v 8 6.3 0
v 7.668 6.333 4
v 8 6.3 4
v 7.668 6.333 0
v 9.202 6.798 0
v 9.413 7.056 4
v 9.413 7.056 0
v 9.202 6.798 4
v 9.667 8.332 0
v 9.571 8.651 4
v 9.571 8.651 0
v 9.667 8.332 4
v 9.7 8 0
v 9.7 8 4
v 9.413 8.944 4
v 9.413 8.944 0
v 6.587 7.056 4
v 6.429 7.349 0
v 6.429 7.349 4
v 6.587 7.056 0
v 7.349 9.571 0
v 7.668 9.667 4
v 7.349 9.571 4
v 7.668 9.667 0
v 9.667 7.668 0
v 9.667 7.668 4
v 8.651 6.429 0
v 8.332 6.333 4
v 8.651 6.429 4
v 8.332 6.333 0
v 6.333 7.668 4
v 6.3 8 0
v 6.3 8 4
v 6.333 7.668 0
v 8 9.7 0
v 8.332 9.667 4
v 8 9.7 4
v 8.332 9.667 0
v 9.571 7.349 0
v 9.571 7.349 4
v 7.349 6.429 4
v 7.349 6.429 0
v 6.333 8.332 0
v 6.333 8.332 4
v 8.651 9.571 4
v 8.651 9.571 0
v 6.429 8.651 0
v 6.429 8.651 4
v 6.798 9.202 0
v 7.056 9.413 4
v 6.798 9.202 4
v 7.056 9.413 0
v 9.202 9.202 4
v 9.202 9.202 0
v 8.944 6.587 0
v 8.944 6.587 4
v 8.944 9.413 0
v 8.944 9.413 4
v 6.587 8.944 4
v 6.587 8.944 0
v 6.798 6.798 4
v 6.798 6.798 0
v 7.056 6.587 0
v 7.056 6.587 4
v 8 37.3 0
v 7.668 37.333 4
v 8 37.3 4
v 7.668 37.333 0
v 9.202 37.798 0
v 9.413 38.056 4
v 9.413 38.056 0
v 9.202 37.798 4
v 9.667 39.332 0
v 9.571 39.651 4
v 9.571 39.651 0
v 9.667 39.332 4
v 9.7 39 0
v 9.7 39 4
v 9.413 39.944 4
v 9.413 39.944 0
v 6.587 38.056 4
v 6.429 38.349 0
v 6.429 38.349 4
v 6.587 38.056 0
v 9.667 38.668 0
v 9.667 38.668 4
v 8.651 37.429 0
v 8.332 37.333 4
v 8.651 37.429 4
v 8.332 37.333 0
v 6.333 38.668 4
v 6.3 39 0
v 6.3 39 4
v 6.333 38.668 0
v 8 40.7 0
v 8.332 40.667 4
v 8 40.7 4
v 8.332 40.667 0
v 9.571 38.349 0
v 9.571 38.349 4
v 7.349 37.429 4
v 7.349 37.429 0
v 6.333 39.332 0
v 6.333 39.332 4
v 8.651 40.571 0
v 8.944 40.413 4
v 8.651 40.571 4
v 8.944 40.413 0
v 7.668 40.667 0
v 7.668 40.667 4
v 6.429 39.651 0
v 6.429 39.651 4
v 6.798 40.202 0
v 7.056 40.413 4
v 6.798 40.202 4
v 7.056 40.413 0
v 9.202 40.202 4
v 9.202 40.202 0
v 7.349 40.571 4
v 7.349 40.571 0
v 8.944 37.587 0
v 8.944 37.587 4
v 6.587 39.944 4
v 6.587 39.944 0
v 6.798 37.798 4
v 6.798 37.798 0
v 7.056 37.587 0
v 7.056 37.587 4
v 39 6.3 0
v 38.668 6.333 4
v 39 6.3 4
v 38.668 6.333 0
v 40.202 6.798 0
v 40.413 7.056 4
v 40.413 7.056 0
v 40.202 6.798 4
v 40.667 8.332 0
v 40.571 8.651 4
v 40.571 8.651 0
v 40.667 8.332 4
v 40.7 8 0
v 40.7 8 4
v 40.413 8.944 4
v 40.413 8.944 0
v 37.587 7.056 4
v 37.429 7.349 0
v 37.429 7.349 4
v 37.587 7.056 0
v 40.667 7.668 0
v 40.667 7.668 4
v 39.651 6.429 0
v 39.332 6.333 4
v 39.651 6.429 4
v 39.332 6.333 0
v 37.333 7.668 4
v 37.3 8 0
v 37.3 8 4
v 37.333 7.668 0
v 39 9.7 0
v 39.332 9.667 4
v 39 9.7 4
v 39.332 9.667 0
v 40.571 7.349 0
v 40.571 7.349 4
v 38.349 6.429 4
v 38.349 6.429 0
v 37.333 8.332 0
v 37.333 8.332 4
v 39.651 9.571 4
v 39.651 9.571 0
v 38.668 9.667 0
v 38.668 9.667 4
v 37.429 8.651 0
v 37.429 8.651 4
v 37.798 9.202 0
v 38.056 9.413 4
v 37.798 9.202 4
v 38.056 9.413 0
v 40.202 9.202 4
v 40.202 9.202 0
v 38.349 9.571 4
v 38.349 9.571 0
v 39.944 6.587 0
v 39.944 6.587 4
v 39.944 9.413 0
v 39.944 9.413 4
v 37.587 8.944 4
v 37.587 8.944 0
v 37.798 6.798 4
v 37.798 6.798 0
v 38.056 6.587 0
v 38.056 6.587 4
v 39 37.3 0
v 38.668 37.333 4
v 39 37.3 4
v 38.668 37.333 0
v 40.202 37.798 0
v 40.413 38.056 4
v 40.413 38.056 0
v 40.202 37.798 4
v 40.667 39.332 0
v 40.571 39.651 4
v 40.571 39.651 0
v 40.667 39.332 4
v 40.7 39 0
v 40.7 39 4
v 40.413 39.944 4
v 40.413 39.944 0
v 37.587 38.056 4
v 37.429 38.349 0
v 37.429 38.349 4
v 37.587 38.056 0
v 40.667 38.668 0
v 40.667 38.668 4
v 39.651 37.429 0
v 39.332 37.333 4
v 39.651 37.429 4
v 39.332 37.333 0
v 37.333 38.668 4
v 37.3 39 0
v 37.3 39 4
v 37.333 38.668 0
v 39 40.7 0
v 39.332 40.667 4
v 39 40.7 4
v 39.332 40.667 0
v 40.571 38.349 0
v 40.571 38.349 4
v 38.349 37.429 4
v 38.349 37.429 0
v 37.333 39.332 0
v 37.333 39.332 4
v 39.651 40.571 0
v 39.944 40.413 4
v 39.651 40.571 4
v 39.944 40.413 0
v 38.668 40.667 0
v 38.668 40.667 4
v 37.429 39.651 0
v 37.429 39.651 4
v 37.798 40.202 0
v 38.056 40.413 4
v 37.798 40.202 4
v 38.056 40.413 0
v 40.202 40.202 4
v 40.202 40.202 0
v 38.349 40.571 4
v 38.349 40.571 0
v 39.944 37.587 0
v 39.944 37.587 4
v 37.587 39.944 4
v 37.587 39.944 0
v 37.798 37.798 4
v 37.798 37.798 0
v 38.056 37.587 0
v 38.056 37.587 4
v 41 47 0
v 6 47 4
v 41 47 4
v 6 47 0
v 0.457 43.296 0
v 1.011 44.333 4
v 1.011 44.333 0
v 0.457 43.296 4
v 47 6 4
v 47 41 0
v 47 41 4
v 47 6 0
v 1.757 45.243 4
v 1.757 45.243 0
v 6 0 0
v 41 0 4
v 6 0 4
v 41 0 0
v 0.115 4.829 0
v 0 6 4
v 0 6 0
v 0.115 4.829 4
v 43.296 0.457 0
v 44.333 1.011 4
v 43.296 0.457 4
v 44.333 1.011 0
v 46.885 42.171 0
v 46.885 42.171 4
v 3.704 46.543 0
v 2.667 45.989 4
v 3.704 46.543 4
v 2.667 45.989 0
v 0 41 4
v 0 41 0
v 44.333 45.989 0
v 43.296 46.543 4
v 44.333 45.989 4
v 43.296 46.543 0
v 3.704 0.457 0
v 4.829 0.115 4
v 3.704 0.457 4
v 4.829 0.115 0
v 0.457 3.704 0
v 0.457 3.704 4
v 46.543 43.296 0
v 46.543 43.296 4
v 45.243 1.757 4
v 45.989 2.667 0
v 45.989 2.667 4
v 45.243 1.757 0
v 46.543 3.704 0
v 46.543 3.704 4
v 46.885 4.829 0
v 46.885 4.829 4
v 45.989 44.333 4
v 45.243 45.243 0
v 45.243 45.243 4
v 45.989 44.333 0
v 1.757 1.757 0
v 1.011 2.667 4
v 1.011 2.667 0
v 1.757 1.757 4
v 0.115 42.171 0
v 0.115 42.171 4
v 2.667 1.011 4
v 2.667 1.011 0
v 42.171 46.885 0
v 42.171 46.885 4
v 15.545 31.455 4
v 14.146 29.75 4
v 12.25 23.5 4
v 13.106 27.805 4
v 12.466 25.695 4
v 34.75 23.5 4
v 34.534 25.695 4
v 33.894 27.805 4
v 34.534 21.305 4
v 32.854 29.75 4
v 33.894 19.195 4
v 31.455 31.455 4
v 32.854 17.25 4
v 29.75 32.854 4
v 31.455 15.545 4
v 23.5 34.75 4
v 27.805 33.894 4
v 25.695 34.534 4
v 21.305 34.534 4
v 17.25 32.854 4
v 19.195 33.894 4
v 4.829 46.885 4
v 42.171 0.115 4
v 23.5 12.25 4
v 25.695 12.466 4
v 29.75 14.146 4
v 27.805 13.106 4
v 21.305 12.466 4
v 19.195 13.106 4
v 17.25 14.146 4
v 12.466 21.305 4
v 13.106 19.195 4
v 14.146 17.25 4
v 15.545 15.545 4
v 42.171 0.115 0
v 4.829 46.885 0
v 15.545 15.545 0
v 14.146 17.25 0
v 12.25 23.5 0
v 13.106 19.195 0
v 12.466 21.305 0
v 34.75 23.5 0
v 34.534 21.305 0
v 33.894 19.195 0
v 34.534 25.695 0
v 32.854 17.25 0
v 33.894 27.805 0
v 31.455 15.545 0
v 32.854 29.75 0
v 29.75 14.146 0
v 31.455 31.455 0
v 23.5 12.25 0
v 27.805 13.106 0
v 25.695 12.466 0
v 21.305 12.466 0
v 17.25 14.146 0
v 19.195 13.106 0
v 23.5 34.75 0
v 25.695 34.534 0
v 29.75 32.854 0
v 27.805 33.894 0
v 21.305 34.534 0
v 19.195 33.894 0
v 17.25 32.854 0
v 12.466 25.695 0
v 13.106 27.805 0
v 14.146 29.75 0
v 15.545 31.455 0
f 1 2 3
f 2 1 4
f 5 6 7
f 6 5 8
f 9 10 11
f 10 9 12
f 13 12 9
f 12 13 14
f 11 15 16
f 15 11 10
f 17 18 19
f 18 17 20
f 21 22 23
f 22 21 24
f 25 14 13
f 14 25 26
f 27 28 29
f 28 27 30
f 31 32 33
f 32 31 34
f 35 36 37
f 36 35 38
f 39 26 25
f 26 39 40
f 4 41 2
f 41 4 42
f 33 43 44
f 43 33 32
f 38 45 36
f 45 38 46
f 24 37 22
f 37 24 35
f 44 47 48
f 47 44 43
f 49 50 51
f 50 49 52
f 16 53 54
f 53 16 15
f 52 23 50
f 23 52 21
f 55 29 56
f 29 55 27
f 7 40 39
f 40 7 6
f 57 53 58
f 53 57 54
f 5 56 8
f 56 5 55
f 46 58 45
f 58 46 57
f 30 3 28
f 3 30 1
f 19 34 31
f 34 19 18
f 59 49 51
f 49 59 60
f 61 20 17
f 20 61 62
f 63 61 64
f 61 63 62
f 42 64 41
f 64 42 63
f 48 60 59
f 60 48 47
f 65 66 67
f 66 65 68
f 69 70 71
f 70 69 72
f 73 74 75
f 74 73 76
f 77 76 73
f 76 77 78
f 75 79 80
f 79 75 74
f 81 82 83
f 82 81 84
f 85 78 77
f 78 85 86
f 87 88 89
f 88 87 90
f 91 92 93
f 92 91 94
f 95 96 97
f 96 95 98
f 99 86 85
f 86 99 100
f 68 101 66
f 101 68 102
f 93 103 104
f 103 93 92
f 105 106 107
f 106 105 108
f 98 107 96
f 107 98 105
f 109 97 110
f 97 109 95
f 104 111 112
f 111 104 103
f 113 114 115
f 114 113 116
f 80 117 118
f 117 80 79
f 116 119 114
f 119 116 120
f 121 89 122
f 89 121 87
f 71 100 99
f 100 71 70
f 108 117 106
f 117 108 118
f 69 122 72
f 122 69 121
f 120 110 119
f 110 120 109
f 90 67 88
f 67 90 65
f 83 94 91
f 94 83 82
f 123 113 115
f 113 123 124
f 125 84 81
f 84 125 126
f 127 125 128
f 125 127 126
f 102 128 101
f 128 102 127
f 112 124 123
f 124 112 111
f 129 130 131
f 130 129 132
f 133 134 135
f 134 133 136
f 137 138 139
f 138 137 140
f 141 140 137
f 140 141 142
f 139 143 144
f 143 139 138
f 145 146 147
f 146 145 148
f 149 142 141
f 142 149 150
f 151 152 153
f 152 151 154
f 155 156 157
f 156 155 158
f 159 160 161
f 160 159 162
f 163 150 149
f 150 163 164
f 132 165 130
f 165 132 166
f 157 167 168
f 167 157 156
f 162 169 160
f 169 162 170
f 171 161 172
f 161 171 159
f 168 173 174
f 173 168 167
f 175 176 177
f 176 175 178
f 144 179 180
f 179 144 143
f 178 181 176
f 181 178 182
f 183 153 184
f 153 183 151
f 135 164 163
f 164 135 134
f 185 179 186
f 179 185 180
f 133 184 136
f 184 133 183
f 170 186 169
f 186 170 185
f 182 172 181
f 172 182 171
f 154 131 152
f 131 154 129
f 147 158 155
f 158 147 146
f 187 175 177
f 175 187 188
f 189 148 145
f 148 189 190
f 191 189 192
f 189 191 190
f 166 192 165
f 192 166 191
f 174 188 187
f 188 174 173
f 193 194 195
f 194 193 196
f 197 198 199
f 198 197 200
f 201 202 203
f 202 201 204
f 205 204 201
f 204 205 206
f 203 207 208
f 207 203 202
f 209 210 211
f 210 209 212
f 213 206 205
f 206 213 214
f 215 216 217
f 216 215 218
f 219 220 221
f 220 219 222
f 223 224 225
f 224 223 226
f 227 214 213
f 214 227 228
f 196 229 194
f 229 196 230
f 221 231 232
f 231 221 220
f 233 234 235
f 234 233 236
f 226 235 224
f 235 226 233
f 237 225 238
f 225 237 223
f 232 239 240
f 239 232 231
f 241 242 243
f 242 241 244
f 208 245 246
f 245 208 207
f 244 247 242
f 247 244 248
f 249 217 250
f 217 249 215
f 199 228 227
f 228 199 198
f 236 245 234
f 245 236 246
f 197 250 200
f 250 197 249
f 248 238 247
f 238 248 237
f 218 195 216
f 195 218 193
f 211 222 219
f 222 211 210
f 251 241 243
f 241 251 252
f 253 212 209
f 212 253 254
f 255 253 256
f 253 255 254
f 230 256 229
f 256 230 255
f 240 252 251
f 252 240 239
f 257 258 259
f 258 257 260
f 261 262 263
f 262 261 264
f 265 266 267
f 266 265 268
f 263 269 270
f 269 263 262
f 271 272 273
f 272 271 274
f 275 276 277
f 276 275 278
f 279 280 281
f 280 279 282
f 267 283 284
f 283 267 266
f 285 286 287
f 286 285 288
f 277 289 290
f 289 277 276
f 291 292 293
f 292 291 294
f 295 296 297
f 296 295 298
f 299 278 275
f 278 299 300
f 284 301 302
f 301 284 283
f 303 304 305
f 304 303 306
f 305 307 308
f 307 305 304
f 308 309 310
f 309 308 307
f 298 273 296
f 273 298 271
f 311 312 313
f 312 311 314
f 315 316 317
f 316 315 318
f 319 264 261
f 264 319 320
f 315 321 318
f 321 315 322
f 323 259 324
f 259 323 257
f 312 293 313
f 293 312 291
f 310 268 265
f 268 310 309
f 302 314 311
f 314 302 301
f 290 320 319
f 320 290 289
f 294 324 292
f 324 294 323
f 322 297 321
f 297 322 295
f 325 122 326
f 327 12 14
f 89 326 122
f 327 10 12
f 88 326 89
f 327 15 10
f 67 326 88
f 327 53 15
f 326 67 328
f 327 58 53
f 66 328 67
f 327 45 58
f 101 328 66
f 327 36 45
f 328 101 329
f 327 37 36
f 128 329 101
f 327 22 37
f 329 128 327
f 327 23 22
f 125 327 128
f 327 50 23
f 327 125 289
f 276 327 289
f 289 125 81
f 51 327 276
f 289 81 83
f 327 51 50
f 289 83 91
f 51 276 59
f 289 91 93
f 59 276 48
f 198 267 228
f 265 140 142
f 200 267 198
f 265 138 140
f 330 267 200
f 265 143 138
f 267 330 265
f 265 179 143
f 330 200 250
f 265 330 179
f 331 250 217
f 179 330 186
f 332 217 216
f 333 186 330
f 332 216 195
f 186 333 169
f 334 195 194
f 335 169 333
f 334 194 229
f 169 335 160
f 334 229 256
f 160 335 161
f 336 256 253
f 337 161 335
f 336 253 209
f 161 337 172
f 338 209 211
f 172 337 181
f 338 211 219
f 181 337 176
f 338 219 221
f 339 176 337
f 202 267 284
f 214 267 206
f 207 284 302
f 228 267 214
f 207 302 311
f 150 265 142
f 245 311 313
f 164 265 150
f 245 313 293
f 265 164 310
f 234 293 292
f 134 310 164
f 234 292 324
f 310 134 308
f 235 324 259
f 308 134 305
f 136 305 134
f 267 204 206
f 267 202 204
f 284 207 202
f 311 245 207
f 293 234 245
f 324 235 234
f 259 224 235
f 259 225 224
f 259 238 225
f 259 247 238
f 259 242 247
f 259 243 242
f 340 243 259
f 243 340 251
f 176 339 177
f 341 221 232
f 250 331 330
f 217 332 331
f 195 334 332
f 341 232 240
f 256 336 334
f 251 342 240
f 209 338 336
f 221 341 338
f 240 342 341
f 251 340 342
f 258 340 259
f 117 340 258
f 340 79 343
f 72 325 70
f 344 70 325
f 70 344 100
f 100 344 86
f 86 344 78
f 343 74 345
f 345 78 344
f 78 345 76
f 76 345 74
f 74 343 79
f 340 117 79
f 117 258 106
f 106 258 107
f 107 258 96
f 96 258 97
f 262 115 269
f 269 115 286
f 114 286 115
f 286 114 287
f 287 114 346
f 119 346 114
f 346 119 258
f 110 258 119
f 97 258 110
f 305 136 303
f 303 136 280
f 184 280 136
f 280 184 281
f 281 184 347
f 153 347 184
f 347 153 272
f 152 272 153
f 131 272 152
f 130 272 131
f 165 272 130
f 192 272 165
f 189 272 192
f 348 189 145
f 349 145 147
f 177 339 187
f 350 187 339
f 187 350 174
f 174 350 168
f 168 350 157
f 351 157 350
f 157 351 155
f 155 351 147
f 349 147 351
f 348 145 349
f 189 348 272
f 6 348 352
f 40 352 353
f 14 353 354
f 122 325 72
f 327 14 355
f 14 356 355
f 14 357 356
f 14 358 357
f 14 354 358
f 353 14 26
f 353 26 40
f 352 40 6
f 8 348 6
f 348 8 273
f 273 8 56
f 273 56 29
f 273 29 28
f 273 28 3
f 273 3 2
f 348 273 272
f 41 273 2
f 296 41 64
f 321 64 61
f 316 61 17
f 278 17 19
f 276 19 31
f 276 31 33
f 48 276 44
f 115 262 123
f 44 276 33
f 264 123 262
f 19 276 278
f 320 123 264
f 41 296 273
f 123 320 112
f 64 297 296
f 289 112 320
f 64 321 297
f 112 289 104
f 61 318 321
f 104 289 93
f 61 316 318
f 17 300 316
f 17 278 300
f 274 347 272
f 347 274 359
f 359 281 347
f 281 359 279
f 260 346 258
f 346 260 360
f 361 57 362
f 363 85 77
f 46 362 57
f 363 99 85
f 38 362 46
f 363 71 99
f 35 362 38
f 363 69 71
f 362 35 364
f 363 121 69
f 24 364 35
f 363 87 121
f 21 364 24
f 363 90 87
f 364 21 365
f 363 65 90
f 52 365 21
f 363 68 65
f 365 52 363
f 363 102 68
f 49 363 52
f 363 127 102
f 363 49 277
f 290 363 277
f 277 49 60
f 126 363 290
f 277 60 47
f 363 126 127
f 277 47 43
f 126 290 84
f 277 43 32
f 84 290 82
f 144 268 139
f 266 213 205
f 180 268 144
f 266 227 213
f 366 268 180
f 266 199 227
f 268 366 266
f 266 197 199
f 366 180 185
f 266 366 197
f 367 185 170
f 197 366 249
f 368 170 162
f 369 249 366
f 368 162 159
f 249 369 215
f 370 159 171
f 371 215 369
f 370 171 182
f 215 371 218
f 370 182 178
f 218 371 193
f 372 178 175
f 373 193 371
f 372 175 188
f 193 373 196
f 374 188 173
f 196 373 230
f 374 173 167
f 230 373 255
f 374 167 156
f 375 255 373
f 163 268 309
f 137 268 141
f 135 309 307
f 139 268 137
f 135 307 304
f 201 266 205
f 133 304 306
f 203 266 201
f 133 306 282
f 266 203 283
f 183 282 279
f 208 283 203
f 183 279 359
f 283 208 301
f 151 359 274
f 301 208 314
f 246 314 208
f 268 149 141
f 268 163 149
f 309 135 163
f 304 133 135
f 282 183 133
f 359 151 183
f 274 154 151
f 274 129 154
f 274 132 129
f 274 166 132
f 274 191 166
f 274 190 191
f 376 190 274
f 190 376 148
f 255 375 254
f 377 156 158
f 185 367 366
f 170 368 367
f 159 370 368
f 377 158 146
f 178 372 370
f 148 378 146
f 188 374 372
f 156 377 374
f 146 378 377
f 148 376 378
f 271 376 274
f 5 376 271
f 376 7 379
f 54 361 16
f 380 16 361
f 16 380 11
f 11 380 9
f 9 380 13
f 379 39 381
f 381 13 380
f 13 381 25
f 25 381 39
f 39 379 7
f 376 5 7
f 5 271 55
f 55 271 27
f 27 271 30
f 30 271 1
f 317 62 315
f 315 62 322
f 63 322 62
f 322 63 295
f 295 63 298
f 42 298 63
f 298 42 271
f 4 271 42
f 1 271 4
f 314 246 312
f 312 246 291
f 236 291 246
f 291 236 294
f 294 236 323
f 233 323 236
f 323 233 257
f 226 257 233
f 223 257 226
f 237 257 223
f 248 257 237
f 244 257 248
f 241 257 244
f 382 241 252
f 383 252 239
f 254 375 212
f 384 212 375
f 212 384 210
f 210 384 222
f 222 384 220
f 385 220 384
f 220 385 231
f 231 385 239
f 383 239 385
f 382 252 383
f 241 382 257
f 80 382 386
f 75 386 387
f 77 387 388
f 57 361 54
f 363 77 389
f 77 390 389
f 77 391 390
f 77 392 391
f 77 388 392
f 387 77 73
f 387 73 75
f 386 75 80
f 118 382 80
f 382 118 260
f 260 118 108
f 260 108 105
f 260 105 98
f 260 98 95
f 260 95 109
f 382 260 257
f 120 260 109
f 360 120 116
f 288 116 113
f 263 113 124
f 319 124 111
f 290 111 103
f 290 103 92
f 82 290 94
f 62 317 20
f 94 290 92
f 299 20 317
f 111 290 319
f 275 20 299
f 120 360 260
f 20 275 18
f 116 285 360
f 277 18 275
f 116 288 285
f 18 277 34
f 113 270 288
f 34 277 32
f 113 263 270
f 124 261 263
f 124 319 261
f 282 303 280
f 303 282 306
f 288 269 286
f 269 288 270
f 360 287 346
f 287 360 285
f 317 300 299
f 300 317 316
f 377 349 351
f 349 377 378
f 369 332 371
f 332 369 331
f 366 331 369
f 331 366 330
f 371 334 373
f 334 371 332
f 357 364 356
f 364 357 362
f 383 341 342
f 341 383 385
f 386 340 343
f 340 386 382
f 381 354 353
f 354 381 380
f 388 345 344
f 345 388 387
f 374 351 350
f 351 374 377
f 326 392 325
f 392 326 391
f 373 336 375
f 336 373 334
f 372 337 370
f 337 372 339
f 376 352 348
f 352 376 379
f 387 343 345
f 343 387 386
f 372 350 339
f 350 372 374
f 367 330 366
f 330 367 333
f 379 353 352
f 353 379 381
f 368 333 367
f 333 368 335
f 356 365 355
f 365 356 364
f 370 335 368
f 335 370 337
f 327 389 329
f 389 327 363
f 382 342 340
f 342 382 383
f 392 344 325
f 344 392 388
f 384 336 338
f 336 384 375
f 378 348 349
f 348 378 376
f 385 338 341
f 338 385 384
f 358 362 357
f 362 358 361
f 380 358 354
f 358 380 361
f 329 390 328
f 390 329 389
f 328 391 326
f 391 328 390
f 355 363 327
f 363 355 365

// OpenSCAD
$fn = 32;
// NEMA 17 motor mount plate.

size = 47;
thickness = 4;
spacing = 31;
bolt_d = 3.4;
pilot_d = 22.5;
radius = 6;

difference() {
    hull()
        for (x = [radius, size - radius], y = [radius, size - radius])
            translate([x, y, 0]) cylinder(h = thickness, r = radius);
    translate([size / 2, size / 2, -1])
        cylinder(h = thickness + 2, d = pilot_d);
    for (dx = [-spacing / 2, spacing / 2], dy = [-spacing / 2, spacing / 2])
        translate([size / 2 + dx, size / 2 + dy, -1])
            cylinder(h = thickness + 2, d = bolt_d);
}
